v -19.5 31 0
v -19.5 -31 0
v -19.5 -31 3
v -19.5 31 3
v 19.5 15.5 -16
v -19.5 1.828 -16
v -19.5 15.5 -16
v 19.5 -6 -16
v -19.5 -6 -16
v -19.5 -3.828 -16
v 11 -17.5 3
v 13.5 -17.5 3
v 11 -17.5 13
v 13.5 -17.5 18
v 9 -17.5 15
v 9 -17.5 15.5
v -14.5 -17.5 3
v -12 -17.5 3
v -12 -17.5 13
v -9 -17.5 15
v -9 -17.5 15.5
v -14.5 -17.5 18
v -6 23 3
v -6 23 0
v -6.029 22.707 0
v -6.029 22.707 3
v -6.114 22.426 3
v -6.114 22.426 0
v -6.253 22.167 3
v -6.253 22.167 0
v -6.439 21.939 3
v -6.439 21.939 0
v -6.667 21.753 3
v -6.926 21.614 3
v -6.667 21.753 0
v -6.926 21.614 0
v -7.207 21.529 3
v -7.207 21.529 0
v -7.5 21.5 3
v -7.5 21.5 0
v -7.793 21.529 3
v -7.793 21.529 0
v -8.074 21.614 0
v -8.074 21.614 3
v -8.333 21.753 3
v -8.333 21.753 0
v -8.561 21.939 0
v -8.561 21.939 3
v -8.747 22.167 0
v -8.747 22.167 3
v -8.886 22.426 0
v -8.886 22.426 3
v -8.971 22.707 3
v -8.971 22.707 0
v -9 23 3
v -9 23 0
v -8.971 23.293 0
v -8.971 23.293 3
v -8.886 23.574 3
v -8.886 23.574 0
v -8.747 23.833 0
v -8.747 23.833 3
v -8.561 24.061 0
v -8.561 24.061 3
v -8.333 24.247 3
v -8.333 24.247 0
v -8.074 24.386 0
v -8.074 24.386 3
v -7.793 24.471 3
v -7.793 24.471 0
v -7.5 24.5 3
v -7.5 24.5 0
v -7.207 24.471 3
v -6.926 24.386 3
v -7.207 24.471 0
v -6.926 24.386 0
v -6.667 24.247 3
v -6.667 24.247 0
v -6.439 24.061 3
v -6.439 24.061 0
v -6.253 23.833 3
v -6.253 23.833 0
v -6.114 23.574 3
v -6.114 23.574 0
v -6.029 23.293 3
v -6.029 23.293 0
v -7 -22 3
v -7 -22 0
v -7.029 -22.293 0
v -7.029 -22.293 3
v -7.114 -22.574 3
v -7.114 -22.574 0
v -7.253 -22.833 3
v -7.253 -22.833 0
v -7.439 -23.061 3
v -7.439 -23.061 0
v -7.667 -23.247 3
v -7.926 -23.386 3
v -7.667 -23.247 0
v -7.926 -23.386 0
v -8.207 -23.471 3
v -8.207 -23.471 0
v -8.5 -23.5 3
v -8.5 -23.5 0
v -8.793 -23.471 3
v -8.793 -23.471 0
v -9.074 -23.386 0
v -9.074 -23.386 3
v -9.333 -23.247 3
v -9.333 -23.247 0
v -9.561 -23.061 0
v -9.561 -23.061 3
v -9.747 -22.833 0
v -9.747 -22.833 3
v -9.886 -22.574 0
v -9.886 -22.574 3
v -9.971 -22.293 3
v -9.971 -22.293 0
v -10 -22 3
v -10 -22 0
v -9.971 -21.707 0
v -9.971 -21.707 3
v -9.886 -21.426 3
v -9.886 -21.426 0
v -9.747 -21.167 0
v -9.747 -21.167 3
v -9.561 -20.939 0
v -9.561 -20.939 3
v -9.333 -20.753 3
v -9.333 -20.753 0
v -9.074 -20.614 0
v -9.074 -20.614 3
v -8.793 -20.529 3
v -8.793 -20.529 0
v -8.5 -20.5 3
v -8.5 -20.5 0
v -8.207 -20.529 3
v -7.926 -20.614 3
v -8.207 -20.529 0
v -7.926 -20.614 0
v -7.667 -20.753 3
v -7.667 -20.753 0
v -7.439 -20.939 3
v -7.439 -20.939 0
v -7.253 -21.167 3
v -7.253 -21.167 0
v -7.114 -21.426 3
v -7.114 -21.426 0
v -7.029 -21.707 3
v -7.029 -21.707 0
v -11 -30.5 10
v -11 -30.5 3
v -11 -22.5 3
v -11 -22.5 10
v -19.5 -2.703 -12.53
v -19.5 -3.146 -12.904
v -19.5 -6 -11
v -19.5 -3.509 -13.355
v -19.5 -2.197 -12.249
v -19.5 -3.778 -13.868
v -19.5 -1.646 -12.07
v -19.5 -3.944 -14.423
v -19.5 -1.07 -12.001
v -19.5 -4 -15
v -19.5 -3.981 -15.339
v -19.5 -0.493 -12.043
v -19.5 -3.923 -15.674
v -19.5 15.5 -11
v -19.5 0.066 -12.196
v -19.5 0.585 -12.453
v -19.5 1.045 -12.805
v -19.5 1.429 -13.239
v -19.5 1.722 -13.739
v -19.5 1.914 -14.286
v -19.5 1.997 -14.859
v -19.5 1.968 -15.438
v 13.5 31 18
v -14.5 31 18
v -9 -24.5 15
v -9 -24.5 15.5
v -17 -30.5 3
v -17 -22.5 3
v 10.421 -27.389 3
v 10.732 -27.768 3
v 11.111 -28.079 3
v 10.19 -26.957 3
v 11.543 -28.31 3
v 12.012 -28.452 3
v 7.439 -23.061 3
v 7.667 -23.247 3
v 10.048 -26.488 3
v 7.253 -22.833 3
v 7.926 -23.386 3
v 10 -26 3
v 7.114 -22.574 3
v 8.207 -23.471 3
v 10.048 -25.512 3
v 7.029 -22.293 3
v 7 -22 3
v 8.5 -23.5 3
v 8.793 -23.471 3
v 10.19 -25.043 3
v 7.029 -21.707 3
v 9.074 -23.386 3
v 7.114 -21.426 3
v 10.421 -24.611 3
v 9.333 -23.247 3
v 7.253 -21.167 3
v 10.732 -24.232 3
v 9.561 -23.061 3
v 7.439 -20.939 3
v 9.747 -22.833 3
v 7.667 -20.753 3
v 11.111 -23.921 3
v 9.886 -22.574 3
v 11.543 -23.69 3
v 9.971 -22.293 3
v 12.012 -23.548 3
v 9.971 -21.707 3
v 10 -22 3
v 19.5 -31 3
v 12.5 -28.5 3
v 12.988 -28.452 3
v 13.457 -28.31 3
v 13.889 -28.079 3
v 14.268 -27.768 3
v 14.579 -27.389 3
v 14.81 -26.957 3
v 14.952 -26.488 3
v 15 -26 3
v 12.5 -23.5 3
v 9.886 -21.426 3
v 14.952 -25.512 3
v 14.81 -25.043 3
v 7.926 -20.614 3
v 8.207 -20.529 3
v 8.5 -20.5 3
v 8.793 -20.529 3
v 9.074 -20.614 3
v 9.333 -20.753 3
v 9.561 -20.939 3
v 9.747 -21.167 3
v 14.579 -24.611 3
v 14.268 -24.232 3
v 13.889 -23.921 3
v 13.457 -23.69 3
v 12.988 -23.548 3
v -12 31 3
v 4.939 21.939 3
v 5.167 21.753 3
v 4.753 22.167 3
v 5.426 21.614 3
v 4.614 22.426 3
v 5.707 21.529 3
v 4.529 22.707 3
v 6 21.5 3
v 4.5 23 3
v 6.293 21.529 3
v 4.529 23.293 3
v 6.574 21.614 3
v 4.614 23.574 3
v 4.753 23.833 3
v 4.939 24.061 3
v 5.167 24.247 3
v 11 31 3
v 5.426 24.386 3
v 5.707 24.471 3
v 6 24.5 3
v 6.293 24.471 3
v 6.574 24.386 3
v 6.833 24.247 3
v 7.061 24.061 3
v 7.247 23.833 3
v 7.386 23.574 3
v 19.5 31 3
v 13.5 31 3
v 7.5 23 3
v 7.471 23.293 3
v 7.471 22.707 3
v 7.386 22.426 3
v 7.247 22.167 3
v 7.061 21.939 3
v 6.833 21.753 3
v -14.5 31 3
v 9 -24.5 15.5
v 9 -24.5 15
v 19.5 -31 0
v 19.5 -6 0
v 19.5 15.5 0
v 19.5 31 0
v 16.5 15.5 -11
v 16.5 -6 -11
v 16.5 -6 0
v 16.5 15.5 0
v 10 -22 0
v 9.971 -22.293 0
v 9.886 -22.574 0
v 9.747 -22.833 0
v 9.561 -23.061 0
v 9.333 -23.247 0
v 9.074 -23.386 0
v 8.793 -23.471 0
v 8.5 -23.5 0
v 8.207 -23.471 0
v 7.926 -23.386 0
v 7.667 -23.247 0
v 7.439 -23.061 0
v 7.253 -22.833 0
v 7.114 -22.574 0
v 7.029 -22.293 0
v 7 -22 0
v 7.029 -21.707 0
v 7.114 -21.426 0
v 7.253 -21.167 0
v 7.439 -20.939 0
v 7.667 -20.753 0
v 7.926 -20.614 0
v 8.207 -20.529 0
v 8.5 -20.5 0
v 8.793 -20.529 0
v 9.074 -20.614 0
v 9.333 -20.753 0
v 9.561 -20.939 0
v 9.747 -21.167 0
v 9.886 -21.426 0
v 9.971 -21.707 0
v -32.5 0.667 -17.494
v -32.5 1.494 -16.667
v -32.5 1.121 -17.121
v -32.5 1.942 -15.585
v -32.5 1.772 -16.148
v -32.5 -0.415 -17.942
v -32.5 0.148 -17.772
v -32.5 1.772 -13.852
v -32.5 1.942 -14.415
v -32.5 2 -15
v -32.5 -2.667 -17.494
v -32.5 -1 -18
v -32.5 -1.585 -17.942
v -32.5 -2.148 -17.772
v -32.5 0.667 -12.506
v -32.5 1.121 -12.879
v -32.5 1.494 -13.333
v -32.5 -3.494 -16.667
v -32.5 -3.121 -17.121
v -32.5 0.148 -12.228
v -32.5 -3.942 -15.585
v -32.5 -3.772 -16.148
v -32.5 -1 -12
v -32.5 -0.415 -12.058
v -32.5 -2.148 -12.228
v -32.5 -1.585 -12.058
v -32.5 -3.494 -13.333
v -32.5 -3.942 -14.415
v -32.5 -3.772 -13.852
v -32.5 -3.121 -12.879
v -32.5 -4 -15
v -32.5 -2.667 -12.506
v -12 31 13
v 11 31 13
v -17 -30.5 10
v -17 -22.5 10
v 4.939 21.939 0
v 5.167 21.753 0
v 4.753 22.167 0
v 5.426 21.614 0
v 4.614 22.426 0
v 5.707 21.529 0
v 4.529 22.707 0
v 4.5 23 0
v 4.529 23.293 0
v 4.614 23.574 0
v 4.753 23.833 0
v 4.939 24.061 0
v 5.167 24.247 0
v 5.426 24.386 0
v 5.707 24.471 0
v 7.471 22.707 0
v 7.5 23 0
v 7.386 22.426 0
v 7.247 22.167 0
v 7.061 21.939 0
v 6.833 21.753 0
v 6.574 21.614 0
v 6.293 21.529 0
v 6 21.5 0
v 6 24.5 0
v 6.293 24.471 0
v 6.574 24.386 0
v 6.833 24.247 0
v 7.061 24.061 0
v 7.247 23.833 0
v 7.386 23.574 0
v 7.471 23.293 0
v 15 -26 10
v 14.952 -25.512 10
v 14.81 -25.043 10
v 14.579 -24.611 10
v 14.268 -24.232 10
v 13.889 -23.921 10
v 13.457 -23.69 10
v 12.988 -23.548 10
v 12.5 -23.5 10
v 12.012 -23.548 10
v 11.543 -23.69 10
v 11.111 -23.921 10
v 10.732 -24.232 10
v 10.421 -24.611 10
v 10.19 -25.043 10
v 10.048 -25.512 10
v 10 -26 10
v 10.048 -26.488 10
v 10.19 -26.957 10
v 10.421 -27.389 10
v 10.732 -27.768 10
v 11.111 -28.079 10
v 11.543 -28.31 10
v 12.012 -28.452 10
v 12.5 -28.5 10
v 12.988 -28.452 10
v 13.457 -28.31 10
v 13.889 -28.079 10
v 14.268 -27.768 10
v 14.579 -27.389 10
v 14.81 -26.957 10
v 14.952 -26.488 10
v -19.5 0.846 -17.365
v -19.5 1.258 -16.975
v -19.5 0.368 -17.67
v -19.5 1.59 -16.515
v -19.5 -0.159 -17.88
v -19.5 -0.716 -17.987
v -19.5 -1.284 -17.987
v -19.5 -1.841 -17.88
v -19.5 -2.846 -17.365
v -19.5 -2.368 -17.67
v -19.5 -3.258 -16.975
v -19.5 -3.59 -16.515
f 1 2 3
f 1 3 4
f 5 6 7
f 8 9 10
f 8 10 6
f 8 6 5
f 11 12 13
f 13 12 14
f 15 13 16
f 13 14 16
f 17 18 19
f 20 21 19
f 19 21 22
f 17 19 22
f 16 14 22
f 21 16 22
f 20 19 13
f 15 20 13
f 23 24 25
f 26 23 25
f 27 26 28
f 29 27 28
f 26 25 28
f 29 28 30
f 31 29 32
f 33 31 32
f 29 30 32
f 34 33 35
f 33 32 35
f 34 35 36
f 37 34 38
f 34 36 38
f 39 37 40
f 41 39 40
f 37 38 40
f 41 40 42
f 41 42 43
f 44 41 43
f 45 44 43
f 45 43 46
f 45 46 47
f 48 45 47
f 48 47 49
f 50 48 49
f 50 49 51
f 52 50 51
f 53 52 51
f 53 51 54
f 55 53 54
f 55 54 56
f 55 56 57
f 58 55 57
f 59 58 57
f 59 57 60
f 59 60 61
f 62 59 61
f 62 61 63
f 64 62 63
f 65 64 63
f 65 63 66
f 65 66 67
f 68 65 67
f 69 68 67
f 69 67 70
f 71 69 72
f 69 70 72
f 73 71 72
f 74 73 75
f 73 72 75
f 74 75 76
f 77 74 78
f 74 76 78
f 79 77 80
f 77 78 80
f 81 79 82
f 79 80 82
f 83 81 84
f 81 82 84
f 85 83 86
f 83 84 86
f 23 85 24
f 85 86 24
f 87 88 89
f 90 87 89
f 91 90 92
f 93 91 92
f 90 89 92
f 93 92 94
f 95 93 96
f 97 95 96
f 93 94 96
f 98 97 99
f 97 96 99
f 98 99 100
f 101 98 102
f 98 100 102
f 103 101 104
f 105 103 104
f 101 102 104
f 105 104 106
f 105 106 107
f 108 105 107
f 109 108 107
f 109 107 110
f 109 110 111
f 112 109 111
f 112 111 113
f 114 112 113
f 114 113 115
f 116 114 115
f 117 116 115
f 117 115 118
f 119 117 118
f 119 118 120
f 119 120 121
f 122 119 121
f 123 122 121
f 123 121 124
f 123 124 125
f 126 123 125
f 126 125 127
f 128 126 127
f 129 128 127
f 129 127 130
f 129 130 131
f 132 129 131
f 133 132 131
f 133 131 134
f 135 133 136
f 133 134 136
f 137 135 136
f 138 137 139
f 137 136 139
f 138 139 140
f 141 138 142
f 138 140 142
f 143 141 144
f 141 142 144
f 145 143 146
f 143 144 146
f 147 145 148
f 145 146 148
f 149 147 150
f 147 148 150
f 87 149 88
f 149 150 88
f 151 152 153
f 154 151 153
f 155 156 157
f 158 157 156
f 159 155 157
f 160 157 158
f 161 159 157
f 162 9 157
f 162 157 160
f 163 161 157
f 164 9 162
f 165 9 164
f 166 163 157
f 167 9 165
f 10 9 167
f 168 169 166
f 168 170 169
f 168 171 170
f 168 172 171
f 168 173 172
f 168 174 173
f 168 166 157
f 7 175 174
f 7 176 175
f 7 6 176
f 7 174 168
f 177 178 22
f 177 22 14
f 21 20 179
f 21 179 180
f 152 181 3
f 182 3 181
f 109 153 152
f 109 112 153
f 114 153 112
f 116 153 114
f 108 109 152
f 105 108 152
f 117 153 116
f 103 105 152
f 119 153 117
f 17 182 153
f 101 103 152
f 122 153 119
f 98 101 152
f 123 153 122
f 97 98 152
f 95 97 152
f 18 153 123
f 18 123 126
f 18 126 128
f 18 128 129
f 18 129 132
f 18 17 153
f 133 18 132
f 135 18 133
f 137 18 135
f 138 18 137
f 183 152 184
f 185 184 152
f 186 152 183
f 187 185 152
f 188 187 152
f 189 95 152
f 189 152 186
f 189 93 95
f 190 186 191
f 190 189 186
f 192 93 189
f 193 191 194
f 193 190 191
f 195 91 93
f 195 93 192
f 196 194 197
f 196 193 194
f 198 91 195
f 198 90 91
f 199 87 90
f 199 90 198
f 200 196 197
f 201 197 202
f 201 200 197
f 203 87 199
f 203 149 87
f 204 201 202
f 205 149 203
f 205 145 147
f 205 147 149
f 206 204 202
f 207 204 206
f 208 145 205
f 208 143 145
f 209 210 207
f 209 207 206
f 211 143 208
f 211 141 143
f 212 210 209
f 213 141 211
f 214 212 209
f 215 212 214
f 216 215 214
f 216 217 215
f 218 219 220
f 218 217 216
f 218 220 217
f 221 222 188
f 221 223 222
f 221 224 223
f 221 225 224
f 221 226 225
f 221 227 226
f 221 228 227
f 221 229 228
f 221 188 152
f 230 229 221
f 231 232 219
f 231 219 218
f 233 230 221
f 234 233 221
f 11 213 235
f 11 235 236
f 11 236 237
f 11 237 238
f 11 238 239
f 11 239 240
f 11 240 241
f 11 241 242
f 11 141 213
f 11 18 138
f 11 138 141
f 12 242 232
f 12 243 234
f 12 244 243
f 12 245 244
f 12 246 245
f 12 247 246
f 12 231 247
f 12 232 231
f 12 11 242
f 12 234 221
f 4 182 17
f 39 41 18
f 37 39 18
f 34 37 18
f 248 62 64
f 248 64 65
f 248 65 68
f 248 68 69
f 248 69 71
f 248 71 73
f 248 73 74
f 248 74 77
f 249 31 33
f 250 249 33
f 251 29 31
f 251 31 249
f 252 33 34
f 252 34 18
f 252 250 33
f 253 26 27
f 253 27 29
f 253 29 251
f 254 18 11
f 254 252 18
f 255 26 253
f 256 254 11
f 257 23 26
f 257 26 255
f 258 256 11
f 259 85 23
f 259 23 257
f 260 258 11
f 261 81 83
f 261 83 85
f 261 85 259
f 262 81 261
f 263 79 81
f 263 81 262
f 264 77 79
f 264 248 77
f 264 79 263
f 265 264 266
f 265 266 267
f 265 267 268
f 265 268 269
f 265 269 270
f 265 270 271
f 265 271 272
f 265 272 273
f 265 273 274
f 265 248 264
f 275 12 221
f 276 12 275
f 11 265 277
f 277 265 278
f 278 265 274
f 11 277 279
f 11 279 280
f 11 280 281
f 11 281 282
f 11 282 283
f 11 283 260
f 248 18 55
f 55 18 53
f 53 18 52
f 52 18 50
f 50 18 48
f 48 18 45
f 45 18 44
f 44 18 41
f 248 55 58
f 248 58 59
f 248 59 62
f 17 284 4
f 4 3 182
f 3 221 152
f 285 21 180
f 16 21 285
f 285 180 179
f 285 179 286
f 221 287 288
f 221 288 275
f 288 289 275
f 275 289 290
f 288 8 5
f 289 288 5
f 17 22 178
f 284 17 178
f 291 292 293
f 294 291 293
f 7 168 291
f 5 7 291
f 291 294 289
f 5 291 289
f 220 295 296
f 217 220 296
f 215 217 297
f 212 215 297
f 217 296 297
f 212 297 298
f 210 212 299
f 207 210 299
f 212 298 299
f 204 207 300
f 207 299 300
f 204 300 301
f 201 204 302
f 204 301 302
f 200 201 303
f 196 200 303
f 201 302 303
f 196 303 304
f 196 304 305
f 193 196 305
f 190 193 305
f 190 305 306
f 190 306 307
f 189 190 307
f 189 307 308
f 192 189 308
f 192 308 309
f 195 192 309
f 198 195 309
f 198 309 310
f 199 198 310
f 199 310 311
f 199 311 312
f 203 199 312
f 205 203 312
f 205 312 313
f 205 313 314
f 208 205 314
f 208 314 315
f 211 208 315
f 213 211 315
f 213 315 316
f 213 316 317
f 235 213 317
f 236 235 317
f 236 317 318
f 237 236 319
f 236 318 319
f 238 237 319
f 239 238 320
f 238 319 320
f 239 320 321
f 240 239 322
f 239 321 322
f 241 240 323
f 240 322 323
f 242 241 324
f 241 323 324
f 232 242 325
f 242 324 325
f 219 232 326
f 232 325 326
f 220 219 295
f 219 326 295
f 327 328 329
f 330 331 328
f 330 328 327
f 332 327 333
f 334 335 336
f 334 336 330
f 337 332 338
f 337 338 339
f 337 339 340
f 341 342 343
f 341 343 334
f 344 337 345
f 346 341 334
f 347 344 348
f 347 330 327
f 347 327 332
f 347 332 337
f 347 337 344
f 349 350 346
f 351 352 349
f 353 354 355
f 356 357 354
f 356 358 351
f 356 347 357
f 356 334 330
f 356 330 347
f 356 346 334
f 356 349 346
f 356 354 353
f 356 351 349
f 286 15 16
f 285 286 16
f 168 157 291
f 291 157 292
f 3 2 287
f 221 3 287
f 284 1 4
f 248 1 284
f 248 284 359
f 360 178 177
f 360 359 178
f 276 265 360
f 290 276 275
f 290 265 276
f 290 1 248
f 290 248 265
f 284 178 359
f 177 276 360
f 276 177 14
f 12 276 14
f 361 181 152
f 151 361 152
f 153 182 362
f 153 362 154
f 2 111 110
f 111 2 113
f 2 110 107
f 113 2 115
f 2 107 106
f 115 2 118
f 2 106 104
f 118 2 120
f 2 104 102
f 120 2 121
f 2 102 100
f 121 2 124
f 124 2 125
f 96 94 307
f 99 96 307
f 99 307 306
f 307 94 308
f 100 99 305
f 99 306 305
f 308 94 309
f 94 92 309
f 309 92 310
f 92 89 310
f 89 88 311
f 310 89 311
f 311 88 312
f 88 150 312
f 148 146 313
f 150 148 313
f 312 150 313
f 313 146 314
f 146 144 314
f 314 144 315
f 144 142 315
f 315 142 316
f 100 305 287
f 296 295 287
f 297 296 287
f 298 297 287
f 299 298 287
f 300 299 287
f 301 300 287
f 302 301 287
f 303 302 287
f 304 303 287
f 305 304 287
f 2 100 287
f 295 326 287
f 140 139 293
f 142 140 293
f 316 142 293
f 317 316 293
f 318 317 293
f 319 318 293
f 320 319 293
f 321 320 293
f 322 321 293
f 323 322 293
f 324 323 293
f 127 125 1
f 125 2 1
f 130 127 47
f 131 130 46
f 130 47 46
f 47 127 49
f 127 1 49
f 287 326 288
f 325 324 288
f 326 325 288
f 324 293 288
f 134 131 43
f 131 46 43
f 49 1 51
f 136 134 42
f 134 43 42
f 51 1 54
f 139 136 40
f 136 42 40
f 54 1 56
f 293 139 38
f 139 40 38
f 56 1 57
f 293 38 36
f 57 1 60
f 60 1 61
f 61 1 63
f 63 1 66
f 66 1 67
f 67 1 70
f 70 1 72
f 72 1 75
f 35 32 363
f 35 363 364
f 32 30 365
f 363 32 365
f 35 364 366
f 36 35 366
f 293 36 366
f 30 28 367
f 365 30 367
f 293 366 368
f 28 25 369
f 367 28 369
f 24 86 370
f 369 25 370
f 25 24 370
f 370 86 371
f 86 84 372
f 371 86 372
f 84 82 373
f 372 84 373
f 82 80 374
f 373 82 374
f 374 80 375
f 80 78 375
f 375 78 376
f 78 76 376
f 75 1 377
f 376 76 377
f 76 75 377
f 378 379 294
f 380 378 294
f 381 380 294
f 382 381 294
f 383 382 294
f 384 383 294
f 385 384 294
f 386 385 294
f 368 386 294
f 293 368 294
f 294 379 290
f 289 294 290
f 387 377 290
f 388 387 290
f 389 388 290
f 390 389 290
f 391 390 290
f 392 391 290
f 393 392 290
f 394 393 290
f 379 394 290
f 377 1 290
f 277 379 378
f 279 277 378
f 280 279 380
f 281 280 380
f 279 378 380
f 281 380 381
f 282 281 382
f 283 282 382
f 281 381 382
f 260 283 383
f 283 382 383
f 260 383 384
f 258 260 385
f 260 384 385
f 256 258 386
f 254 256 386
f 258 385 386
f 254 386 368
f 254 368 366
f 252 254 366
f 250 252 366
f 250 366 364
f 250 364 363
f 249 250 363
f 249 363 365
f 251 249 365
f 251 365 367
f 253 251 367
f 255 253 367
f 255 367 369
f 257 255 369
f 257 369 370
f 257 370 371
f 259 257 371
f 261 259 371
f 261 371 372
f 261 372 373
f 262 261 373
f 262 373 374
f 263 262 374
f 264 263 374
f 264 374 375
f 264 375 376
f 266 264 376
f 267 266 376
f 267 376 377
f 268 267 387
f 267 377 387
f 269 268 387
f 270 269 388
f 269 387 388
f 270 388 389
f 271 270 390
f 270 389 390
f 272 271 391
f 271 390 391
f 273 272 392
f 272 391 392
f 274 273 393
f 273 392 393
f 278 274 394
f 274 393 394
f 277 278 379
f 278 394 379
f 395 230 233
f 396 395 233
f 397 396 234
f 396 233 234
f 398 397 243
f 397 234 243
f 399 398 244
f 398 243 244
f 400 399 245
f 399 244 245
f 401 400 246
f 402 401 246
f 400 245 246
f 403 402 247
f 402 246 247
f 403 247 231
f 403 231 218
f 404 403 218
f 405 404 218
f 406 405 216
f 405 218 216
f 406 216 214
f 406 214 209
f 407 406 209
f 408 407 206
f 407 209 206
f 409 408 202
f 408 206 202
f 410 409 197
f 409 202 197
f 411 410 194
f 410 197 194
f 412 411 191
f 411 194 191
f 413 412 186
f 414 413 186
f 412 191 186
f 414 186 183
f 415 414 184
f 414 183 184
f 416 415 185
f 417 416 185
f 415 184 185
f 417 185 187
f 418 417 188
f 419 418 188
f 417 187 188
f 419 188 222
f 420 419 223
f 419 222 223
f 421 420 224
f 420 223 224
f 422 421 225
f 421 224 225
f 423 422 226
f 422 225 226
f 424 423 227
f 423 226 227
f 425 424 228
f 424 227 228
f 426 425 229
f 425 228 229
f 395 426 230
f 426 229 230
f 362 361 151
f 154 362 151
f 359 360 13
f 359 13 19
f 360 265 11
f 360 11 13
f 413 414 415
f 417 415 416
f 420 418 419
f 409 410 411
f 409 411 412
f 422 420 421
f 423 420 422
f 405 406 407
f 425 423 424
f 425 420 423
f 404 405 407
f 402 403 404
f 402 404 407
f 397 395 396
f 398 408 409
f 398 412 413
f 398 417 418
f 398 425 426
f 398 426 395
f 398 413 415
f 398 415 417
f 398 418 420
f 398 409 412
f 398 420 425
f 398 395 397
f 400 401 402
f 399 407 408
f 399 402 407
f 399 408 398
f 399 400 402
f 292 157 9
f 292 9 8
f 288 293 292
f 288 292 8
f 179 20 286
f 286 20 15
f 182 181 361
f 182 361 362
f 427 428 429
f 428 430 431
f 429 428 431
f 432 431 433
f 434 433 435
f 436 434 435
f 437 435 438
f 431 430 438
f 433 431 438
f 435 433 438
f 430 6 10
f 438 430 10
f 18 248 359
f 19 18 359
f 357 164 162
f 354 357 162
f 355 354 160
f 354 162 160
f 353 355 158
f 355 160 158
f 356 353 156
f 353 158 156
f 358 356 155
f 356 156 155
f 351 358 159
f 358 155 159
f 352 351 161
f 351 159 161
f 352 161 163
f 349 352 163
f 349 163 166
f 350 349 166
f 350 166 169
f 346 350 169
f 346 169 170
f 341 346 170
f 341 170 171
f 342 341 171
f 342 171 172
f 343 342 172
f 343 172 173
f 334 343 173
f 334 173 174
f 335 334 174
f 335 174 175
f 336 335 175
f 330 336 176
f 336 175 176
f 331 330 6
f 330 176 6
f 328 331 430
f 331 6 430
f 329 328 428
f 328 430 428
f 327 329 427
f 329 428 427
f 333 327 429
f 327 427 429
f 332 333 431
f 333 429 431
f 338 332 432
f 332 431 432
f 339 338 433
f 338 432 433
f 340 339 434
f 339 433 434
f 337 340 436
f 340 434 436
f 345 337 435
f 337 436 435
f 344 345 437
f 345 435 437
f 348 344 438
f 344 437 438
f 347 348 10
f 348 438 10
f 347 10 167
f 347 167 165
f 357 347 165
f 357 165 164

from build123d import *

# Parameters (mm, degrees)
SKETCH_W        = 39
SKETCH_H        = 62
PAD_DEPTH       = 18
SKETCH001_W     = 39
SKETCH001_H     = 21.5
PAD001_DEPTH    = 16
SKETCH002_R     = 3
PAD002_DEPTH    = 13
SKETCH003_W     = 36
SKETCH003_H     = 11
POCKET_DEPTH    = 37.001
POCKET001_DEPTH = 15
SKETCH005_W     = 18
SKETCH005_H     = 0.5
PAD003_DEPTH    = 7
SKETCH006_R     = 2.5
SKETCH006_W     = 6
SKETCH006_H     = 8
PAD004_DEPTH    = 7
SKETCH015_R     = 1.5
POCKET005_DEPTH = 5
SKETCH016_W     = 23
SKETCH016_H     = 10
POCKET006_DEPTH = 49


with BuildPart() as part:
    # Sketch → Pad (new body)
    with BuildSketch(Plane.XY):
        Rectangle(SKETCH_W, SKETCH_H)
    extrude(amount=PAD_DEPTH)

    # Sketch001 (on Face5 of Pad) → Pad001 (join)
    with BuildSketch(Plane(origin=(0, 0, 0), x_dir=(1, 0, 0), z_dir=(0, 0, -1))):
        with Locations((0, -4.75)):
            Rectangle(SKETCH001_W, SKETCH001_H)
    extrude(amount=PAD001_DEPTH)

    # Sketch002 (on Face8 of Pad001) → Pad002 (join)
    with BuildSketch(Plane(origin=(-19.5, 0, 0), x_dir=(0, -1, 0), z_dir=(-1, 0, 0))):
        with Locations((1, -15)):
            Circle(SKETCH002_R)
    extrude(amount=PAD002_DEPTH)

    # Sketch003 (on Face11 of Pad002) → Pocket (cut, through all)
    with BuildSketch(Plane.XZ.offset(6)):
        with Locations((-1.5, -5.5)):
            Rectangle(SKETCH003_W, SKETCH003_H)
    extrude(amount=-POCKET_DEPTH, mode=Mode.SUBTRACT)

    # Sketch004 (on Face6 of Pocket) → Pocket001 (cut)
    with BuildSketch(Plane.XY.offset(18)):
        Polygon((13.5, -17.5), (-14.5, -17.5), (-14.5, 31), (-19.5, 31), (-19.5, -31), (19.5, -31), (19.5, 31), (13.5, 31), align=None)
    extrude(amount=-POCKET001_DEPTH, mode=Mode.SUBTRACT)

    # Sketch005 (on Face15 of Pocket001) → Pad003 (join)
    with BuildSketch(Plane.XZ.offset(17.5)):
        with Locations((0, 15.25)):
            Rectangle(SKETCH005_W, SKETCH005_H)
    extrude(amount=PAD003_DEPTH)

    # Sketch006 (on Face5 of Pad003) → Pad004 (join)
    with BuildSketch(Plane.XY.offset(3)):
        with Locations((12.5, -26)):
            Circle(SKETCH006_R)
        with Locations((-14, -26.5)):
            Rectangle(SKETCH006_W, SKETCH006_H)
    extrude(amount=PAD004_DEPTH)

    # Sketch015 (on Face2 of Pad004) → Pocket005 (cut)
    with BuildSketch(Plane(origin=(0, 0, 0), x_dir=(1, 0, 0), z_dir=(0, 0, -1))):
        with Locations((-8.5, 22)):
            Circle(SKETCH015_R)
        with Locations((8.5, 22)):
            Circle(SKETCH015_R)
        with Locations((-7.5, -23)):
            Circle(SKETCH015_R)
        with Locations((6, -23)):
            Circle(SKETCH015_R)
    extrude(amount=-POCKET005_DEPTH, mode=Mode.SUBTRACT)

    # Sketch016 (on Face1 of Pocket005) → Pocket006 (cut)
    with BuildSketch(Plane(origin=(0, 31, 0), x_dir=(-1, 0, 0), z_dir=(0, 1, 0))):
        with Locations((0.5, 8)):
            Rectangle(SKETCH016_W, SKETCH016_H)
    extrude(amount=-POCKET006_DEPTH, mode=Mode.SUBTRACT)


solid = part.part
